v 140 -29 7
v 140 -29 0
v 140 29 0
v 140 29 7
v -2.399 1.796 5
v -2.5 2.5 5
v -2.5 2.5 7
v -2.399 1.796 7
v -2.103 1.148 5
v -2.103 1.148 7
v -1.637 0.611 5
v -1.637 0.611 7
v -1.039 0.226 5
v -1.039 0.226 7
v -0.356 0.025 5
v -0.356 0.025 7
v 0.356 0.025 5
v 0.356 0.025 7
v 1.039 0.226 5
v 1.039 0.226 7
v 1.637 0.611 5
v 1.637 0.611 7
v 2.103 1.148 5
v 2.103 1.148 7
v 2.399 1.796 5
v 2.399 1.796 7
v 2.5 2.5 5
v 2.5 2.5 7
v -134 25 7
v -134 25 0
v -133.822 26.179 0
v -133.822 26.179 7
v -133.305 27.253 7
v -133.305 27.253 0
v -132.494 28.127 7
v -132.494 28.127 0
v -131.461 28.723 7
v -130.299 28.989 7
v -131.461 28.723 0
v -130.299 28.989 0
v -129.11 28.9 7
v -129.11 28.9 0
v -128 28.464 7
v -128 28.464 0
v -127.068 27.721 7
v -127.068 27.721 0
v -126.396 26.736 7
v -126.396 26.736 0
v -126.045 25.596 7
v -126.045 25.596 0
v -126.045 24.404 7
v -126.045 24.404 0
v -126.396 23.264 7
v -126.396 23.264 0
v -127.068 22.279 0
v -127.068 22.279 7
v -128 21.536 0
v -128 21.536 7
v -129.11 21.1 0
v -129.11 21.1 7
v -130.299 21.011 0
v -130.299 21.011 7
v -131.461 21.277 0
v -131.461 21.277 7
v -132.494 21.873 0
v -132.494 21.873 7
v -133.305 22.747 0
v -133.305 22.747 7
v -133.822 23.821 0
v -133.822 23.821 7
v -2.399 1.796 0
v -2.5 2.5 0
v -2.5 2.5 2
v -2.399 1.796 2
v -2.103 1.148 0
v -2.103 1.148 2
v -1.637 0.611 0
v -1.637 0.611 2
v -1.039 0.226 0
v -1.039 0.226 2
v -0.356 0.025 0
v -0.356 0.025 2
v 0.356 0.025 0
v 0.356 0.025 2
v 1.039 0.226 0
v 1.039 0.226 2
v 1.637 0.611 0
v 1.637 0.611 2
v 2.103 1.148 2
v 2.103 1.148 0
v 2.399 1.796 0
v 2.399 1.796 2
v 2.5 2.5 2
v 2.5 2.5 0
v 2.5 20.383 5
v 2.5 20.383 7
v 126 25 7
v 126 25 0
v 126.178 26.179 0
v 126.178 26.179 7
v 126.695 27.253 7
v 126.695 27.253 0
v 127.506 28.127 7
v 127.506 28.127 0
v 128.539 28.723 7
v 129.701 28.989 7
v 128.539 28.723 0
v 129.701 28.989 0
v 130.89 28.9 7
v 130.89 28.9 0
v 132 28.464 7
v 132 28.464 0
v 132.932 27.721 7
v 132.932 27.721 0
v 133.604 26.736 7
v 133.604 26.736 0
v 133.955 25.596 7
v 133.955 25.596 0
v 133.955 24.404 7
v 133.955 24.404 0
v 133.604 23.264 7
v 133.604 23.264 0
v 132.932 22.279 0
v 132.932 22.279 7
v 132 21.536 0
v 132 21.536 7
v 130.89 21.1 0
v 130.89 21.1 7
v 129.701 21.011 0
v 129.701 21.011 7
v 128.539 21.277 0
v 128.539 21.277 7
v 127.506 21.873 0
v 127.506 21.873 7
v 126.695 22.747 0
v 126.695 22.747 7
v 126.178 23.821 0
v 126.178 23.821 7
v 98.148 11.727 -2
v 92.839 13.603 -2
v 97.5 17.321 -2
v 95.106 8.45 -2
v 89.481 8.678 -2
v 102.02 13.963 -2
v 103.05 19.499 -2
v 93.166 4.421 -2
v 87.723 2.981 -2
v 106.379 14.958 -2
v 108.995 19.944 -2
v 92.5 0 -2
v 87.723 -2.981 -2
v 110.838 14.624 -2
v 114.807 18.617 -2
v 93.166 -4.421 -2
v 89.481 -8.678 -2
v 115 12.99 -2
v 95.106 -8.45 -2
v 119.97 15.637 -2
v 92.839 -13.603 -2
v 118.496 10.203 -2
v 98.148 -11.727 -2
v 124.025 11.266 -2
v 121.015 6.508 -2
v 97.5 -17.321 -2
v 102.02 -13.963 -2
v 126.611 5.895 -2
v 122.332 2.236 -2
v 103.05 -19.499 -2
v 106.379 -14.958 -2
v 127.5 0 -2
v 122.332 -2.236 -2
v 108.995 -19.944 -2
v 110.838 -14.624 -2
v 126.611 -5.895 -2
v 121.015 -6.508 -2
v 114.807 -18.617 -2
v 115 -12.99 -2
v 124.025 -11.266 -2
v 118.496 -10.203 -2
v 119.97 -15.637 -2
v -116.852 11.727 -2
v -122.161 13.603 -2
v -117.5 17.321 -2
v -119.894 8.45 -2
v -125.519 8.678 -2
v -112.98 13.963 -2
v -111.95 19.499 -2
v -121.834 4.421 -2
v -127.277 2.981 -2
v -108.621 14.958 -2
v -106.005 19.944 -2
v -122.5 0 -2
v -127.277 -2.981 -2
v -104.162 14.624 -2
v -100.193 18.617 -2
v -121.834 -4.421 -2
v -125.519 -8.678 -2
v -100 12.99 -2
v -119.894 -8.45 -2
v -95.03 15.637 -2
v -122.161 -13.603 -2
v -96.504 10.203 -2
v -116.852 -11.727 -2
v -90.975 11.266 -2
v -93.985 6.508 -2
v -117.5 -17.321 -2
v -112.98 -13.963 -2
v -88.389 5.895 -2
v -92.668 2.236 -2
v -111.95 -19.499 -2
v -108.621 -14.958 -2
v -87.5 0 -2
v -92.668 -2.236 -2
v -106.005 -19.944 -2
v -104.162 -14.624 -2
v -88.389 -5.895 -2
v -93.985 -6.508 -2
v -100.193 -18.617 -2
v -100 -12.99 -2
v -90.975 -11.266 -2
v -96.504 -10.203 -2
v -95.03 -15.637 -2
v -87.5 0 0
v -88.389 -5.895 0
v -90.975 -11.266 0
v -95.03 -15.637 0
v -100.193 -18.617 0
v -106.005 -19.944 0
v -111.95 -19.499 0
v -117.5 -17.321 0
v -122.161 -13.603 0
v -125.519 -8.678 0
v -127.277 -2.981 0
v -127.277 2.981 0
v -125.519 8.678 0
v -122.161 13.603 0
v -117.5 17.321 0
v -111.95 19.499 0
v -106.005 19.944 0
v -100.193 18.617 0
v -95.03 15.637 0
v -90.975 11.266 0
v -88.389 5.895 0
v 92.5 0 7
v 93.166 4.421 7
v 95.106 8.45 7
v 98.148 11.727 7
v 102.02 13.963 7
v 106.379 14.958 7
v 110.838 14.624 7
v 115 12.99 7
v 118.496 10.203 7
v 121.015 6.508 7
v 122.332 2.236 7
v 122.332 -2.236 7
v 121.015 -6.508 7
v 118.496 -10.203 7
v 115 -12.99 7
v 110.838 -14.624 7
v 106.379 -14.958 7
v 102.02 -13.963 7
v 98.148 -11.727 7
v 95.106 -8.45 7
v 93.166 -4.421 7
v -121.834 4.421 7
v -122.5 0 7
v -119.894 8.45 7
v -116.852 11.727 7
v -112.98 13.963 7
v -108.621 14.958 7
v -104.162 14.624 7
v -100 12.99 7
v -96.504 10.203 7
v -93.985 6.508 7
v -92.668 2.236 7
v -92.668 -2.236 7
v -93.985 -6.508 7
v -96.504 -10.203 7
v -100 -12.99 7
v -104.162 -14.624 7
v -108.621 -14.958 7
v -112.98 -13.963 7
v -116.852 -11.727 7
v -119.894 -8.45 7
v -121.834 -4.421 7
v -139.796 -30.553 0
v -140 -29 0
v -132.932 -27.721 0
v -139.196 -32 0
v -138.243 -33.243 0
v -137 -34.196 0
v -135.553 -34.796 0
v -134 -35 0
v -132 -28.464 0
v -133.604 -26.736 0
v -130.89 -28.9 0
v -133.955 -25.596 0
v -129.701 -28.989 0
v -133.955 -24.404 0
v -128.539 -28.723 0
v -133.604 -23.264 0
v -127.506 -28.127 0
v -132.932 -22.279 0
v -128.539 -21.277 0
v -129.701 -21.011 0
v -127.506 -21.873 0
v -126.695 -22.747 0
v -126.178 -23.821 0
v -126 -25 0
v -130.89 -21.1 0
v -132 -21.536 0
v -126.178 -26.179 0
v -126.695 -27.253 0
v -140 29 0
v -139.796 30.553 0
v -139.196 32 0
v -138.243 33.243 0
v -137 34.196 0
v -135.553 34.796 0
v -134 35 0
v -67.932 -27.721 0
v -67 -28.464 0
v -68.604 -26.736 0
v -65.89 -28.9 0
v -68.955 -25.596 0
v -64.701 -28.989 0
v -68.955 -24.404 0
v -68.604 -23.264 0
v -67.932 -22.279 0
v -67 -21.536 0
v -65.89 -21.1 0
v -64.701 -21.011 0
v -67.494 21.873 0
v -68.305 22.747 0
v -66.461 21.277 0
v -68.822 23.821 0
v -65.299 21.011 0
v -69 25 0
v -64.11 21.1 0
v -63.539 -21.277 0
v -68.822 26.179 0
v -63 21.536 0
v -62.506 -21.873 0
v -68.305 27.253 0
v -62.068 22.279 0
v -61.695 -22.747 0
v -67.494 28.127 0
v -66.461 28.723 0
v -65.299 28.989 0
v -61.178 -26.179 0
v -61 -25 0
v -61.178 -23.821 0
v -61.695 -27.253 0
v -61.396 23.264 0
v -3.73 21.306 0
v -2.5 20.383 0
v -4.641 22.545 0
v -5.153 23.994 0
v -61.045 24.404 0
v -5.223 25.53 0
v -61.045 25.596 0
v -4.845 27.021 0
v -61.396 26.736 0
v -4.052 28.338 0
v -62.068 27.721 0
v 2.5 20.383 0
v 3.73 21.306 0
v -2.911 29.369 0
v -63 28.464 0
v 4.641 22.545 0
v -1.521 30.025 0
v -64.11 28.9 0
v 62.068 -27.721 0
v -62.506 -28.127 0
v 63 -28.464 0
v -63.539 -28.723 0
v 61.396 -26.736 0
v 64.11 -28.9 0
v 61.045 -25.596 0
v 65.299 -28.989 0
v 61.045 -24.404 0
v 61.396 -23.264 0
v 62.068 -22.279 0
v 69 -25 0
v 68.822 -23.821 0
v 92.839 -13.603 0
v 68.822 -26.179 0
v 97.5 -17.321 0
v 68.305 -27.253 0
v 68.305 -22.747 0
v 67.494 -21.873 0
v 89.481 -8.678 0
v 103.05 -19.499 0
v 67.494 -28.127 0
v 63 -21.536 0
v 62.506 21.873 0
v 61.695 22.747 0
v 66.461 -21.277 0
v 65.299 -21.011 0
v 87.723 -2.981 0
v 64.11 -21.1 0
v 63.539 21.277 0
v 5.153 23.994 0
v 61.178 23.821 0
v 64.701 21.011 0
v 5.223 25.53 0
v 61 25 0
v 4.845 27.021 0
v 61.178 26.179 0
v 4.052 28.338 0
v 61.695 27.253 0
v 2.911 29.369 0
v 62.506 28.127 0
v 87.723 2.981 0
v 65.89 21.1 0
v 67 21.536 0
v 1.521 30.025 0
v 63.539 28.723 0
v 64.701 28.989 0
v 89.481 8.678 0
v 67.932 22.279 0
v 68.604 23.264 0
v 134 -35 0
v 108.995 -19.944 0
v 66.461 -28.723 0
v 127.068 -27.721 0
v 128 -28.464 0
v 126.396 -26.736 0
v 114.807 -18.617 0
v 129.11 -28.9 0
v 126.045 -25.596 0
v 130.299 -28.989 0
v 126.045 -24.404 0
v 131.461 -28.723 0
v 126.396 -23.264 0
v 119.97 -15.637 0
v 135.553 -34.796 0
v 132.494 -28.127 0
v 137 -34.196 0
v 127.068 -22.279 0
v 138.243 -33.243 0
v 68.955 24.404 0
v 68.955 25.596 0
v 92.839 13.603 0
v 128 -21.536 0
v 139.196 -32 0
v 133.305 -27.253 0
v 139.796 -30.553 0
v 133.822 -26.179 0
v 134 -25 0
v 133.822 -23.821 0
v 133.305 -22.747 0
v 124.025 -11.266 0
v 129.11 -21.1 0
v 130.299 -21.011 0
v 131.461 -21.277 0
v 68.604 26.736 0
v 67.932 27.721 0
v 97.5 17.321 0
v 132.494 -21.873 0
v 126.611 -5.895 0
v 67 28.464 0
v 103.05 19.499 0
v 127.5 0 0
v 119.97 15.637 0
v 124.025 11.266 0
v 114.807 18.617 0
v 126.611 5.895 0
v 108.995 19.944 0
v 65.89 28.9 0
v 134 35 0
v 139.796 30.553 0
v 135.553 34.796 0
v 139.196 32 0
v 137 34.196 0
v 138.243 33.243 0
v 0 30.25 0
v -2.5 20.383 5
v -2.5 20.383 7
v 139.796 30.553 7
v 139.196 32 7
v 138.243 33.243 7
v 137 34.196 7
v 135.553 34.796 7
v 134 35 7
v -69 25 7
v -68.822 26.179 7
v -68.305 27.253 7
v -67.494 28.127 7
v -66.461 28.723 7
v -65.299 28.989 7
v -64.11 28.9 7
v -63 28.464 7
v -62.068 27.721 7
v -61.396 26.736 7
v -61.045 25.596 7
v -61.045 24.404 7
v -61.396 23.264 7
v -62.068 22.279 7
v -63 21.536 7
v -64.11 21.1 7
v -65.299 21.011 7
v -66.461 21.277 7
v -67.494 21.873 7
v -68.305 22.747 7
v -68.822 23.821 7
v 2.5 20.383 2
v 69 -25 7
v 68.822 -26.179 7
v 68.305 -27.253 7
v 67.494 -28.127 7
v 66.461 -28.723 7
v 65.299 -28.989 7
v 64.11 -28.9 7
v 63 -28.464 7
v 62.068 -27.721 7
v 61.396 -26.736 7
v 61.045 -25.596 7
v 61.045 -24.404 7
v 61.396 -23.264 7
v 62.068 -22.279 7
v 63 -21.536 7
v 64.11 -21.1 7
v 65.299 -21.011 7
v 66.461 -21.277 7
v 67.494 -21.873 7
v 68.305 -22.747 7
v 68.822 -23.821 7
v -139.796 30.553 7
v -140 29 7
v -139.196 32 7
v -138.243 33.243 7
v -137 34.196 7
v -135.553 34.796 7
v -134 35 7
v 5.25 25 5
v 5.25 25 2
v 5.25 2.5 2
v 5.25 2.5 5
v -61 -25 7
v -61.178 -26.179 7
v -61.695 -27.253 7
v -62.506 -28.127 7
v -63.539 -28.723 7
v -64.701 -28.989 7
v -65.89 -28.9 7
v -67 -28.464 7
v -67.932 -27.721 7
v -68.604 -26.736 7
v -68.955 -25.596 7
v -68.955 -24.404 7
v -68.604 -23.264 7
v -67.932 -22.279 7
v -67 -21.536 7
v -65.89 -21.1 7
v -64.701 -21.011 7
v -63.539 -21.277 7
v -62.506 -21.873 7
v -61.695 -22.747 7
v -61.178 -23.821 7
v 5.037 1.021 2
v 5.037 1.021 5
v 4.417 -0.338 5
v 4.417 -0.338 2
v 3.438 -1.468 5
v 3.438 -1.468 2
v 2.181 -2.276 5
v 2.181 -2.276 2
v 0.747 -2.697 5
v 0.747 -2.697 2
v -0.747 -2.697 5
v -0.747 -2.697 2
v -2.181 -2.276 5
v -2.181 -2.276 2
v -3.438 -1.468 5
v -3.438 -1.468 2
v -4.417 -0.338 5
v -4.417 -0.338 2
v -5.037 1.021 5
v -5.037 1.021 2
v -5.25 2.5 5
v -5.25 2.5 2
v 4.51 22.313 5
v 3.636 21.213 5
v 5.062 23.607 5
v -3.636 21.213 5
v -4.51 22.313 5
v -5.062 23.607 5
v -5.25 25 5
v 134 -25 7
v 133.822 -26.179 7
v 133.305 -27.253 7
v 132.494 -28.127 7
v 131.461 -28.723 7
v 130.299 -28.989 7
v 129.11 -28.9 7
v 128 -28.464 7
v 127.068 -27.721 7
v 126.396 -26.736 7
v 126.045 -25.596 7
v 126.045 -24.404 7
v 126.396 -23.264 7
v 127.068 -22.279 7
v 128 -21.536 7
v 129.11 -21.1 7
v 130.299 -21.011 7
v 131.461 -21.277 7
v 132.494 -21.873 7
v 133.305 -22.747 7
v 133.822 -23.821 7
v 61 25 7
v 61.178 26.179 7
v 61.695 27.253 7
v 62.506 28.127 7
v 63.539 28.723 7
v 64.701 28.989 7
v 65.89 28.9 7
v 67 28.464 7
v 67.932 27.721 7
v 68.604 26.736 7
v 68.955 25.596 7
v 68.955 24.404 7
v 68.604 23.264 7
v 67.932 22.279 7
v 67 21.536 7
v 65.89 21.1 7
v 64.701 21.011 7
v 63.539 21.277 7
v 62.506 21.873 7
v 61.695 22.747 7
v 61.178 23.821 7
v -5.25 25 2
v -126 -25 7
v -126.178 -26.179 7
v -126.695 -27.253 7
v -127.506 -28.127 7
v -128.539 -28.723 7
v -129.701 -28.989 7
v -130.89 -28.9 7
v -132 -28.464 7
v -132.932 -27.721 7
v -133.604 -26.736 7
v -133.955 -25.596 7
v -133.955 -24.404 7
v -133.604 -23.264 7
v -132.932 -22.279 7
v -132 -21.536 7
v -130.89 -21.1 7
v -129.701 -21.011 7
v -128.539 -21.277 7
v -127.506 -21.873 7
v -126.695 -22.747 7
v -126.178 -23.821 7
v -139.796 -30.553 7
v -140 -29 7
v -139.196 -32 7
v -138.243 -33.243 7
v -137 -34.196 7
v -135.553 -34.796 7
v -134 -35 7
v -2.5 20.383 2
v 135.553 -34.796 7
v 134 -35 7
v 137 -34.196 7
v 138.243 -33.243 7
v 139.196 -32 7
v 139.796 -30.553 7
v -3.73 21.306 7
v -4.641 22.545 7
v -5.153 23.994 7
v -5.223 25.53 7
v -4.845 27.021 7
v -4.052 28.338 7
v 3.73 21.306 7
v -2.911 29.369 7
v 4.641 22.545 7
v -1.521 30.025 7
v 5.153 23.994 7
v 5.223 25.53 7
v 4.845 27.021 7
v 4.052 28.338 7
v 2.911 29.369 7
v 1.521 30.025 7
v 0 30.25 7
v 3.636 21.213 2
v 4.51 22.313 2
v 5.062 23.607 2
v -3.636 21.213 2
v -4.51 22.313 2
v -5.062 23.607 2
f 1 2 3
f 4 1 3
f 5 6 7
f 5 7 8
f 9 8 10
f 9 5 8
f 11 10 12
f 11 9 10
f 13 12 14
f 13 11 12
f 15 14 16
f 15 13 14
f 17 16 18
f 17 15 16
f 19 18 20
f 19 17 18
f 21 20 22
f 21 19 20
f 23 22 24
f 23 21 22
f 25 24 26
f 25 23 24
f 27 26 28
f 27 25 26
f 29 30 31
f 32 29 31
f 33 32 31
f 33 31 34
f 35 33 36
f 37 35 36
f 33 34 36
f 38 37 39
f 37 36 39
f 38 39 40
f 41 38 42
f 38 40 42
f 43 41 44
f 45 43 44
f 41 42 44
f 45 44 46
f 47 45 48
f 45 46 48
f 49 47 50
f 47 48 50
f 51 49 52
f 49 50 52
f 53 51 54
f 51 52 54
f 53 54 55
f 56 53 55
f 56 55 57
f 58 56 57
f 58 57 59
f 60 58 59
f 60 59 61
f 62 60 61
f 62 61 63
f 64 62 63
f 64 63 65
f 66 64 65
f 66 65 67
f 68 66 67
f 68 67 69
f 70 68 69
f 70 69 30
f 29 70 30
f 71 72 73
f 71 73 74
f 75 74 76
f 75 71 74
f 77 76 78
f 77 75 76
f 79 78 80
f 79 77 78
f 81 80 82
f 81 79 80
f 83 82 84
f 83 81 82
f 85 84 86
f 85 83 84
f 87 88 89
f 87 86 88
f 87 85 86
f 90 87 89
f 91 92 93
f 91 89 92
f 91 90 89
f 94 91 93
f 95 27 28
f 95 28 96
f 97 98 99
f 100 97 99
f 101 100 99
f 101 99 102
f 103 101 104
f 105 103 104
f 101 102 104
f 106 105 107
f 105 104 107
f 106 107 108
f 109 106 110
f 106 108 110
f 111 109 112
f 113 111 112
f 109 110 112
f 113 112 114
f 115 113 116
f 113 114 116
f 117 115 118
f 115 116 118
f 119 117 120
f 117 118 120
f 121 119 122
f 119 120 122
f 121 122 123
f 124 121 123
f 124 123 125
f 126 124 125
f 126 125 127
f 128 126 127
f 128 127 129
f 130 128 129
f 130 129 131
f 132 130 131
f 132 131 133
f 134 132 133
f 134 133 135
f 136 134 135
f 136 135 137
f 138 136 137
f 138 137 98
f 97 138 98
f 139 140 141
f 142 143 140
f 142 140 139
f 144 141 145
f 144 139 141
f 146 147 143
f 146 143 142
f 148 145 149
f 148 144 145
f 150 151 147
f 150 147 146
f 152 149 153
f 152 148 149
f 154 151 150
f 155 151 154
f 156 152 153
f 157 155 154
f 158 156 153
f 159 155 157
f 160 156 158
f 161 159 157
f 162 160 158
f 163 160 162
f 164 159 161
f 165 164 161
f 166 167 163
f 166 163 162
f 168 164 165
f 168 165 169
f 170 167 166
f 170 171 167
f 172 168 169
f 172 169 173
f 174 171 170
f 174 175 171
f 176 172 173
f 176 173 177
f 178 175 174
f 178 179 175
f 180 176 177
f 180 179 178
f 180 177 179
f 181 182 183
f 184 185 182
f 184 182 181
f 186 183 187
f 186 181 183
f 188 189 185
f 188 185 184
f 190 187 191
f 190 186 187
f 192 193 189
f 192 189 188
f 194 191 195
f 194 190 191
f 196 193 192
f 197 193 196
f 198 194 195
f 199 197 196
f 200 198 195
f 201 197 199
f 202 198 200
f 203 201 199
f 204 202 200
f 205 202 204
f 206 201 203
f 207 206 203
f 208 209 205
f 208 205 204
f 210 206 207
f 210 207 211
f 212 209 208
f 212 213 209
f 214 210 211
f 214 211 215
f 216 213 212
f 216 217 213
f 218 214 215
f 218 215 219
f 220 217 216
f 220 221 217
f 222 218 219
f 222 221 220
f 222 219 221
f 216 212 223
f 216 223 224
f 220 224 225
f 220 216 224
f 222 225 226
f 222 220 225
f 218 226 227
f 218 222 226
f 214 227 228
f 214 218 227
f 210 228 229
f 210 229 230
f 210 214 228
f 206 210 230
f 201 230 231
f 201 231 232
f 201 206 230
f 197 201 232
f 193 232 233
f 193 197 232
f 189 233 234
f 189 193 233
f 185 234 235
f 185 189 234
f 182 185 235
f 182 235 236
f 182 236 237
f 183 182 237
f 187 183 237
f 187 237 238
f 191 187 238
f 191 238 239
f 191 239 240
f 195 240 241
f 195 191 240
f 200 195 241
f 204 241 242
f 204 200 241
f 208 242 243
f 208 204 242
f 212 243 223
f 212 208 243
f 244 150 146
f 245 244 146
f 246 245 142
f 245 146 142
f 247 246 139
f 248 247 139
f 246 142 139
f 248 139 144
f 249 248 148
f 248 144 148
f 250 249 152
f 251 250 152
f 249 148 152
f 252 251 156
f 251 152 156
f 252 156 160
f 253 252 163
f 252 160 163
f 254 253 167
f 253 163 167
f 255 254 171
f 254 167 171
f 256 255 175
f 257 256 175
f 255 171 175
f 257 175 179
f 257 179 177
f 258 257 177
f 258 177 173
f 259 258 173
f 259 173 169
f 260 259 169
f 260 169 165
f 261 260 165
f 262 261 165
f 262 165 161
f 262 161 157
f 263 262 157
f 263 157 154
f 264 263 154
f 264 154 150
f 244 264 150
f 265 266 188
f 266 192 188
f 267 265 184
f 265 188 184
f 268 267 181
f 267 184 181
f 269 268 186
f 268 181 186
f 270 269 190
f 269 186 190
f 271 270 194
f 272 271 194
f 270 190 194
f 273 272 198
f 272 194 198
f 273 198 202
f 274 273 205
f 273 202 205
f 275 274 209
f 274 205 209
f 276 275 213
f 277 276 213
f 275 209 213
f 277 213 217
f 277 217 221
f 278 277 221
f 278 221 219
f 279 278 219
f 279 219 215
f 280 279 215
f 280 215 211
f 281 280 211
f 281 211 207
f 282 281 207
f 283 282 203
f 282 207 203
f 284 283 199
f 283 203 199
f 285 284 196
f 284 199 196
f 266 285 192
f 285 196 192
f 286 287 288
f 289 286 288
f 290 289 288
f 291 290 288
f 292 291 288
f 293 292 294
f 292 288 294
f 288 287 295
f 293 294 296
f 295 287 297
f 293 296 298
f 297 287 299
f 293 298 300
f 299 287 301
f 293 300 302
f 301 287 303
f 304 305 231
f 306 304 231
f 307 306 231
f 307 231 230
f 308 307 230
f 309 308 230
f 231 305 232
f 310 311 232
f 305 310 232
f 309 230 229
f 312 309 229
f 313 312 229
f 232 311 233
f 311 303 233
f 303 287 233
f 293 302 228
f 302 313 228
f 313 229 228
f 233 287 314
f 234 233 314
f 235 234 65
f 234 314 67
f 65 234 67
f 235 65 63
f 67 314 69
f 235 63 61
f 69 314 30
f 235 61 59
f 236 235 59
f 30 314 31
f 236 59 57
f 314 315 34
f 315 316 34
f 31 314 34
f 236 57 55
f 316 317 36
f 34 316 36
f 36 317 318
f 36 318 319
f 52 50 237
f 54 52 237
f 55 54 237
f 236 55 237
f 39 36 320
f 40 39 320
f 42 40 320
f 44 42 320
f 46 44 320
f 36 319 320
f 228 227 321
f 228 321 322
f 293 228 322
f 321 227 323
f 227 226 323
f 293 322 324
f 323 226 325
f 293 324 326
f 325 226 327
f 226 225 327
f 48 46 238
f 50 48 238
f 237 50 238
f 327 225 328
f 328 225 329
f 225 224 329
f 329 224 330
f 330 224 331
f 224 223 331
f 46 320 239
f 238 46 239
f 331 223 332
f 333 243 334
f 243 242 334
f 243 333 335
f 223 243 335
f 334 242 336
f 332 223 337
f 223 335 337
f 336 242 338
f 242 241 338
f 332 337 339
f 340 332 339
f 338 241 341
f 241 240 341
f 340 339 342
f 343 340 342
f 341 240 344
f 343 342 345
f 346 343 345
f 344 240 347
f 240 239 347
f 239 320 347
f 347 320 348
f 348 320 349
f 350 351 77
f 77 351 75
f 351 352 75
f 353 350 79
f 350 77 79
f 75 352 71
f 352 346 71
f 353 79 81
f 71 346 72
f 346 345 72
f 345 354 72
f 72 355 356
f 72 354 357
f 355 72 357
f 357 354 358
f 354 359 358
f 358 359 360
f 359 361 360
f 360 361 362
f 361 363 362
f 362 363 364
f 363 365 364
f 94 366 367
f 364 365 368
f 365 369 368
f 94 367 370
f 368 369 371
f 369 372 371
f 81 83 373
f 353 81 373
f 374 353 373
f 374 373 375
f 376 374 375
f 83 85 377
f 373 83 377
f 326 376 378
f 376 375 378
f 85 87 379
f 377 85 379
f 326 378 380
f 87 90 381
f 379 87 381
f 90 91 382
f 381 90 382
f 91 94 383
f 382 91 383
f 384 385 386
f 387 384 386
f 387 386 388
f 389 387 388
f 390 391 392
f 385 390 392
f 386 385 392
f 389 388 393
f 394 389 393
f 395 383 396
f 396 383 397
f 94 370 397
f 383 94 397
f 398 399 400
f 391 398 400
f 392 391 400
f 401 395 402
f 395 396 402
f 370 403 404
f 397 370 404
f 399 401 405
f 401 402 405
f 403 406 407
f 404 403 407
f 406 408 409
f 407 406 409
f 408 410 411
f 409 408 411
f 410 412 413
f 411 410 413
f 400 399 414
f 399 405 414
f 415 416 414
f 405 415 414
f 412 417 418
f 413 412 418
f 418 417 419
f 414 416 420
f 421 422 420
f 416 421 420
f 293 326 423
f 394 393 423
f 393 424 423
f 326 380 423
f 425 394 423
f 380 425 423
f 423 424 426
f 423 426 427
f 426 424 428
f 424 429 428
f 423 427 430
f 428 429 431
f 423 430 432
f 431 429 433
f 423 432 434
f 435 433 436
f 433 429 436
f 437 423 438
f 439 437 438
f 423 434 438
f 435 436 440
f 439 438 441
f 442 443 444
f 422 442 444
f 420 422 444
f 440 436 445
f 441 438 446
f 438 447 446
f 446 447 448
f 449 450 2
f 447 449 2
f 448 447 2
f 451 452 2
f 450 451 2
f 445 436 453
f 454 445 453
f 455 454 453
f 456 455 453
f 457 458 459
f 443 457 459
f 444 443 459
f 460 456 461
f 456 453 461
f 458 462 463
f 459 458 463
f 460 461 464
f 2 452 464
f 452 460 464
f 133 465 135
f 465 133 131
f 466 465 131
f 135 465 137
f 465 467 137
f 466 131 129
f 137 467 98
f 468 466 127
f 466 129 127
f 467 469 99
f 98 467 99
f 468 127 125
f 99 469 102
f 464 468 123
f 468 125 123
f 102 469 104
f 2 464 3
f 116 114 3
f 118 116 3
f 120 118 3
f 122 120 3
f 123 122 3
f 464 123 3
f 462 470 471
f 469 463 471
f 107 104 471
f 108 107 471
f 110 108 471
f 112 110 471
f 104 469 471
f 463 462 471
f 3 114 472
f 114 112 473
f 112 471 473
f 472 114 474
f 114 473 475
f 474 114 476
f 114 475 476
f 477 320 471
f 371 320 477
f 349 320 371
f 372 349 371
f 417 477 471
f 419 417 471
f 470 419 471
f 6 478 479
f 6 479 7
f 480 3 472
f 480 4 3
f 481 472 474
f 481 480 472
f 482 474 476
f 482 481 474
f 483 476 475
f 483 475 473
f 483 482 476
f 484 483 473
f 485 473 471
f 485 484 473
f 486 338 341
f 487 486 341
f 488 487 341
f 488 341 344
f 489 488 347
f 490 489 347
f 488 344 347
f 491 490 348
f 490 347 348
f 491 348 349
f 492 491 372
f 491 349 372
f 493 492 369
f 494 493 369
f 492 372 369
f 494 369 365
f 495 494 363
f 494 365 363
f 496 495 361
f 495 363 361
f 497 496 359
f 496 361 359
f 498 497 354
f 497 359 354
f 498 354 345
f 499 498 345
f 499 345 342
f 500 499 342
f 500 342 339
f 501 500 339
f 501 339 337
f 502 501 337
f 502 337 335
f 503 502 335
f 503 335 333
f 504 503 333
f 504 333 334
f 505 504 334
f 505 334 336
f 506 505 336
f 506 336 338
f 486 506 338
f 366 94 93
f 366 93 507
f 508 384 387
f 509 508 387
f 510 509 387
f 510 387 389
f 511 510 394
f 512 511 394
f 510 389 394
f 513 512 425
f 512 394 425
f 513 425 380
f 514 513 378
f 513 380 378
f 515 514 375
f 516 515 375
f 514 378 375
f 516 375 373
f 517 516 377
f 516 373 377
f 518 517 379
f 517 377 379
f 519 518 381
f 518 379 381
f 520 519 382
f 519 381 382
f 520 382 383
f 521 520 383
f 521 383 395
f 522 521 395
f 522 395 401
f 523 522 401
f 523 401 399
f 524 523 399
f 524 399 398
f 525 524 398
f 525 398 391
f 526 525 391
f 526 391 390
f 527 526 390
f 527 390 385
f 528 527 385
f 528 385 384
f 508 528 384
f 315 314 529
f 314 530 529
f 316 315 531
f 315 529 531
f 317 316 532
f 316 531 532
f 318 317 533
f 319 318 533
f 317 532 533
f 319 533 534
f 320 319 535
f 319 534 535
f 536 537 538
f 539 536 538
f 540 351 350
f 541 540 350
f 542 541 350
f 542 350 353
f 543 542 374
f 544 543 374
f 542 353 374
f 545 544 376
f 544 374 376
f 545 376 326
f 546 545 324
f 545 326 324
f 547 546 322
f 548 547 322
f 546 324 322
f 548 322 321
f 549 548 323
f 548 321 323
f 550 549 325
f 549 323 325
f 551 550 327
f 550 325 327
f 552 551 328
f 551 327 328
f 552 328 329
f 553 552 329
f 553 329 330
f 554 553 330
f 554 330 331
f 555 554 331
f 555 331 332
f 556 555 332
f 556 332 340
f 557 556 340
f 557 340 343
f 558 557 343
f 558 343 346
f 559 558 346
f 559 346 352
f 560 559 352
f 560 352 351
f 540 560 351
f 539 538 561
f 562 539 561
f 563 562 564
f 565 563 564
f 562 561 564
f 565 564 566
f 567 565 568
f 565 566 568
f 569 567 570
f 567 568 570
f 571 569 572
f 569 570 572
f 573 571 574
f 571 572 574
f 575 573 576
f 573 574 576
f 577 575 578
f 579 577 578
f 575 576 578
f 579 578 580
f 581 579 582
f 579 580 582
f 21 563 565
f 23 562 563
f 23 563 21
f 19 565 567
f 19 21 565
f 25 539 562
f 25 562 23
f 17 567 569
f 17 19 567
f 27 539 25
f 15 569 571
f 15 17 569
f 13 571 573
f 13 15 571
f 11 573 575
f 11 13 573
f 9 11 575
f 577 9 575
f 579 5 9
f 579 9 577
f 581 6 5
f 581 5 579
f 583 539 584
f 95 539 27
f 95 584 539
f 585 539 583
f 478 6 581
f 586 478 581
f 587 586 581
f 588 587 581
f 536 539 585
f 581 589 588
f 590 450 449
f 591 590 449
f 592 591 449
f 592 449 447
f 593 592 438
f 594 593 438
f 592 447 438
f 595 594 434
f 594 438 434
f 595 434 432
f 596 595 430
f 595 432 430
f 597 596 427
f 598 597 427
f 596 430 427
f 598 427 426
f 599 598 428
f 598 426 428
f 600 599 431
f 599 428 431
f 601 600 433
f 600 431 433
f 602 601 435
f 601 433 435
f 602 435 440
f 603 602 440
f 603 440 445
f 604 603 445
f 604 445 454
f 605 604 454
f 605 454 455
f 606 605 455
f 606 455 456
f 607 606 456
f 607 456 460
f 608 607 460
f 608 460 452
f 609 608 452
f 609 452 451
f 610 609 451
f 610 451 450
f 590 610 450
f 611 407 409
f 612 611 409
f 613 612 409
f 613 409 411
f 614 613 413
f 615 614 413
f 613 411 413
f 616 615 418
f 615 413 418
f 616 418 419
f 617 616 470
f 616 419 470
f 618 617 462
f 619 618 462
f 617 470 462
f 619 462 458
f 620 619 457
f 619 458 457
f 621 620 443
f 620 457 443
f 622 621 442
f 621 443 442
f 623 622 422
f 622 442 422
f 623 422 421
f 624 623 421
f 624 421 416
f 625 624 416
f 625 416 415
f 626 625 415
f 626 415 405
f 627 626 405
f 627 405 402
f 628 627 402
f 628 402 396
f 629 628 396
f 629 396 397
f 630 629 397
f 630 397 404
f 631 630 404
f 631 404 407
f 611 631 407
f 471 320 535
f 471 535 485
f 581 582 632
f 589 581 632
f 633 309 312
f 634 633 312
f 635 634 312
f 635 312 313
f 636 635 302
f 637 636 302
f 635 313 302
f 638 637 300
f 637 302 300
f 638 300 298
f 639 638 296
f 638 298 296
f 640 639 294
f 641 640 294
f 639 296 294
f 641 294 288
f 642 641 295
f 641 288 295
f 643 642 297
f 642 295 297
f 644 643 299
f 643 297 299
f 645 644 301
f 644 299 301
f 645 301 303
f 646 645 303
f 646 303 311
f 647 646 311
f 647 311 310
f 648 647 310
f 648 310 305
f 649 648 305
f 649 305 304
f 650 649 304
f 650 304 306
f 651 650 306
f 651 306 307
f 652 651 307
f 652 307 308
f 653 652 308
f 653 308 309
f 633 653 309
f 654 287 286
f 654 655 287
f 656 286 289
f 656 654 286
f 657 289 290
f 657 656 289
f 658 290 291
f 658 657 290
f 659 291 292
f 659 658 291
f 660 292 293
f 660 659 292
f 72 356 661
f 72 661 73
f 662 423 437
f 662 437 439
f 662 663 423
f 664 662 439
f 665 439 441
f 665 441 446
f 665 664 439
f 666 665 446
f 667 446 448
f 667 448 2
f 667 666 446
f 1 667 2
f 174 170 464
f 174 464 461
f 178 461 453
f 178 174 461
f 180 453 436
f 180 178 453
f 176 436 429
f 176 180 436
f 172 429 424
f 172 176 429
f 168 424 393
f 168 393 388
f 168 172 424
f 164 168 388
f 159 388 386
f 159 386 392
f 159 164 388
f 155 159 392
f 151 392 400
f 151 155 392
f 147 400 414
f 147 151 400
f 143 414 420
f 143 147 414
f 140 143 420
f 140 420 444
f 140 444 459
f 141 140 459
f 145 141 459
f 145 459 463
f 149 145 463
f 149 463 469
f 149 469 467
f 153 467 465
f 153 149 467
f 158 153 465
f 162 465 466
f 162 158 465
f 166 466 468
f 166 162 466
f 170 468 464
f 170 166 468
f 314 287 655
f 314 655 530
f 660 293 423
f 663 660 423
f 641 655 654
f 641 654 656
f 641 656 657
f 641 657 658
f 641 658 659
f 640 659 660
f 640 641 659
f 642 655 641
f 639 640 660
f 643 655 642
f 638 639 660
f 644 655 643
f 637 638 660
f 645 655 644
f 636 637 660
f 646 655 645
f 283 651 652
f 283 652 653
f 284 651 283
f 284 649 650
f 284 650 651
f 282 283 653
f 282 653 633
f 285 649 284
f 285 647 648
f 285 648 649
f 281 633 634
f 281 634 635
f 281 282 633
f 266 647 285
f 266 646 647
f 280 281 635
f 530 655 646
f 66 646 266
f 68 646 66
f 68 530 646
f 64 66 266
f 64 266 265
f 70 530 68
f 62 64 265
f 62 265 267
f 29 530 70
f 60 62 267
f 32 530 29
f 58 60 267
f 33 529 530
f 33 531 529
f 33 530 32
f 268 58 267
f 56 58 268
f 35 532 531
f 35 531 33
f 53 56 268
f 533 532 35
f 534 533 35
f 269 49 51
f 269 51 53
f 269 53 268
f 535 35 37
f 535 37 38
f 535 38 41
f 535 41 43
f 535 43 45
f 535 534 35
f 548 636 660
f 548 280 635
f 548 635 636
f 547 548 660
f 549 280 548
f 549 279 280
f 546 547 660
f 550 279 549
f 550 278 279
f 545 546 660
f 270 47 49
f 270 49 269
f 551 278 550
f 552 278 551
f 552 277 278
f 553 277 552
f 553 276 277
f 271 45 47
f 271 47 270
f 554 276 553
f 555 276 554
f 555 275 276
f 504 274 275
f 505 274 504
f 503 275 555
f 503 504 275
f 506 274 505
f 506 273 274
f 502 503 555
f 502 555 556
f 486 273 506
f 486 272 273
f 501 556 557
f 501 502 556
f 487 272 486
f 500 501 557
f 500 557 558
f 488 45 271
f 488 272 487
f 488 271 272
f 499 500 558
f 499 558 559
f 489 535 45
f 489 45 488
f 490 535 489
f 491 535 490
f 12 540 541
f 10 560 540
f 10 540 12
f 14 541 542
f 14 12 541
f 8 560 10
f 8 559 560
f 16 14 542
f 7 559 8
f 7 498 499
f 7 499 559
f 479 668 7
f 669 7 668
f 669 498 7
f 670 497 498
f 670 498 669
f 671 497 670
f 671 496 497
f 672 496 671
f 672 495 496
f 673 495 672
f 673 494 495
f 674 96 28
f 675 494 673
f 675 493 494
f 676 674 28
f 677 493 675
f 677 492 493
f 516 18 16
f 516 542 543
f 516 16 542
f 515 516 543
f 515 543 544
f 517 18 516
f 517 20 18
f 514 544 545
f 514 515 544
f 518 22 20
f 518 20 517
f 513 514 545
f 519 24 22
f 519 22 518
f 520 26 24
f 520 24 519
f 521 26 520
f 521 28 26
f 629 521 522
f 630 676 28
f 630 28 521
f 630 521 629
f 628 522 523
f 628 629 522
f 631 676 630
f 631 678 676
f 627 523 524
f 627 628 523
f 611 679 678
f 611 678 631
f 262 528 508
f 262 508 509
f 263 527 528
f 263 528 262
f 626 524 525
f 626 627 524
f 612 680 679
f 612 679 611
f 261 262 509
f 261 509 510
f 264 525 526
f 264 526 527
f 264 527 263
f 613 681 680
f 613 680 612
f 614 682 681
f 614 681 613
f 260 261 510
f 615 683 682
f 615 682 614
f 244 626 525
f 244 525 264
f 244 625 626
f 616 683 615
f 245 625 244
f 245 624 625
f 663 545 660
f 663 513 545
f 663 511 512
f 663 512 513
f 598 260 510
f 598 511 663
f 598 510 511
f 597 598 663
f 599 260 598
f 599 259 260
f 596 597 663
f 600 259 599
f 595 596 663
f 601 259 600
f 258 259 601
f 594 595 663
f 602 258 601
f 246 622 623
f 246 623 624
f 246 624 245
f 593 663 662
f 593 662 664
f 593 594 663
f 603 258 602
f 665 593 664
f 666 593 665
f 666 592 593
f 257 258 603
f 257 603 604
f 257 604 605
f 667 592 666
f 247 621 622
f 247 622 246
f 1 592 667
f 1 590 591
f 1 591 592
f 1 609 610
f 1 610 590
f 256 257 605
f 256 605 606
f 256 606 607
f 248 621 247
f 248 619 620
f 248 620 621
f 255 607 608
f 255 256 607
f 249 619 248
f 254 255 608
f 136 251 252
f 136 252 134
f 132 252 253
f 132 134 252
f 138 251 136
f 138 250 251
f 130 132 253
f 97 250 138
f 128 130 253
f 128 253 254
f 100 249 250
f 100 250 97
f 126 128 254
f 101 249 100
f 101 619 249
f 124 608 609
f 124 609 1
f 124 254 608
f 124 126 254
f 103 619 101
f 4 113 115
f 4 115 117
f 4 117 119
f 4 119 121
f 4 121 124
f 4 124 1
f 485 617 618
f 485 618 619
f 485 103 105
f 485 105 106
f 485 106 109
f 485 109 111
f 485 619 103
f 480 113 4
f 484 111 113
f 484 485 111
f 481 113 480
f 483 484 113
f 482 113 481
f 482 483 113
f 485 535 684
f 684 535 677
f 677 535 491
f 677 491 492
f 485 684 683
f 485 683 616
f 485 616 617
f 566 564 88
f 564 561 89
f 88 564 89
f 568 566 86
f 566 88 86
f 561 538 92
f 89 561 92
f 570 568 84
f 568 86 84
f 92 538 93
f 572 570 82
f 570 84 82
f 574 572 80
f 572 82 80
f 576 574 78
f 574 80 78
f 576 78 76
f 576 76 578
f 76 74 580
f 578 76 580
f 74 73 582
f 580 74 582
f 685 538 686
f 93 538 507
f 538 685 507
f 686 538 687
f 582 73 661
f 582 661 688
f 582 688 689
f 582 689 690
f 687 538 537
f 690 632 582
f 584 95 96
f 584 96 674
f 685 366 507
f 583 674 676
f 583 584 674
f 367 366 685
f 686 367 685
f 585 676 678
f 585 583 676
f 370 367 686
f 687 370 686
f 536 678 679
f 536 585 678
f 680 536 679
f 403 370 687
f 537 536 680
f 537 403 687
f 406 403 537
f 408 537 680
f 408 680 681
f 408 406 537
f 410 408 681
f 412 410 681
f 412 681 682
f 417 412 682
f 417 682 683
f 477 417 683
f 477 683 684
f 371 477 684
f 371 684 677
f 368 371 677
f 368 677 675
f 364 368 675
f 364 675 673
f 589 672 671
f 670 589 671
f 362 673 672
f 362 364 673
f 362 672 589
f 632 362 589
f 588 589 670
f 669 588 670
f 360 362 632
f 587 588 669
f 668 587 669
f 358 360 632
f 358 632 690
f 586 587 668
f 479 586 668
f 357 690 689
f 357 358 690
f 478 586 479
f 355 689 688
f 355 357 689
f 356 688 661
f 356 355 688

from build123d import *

# Parameters (mm, degrees)
SKETCH1_W           = 280
SKETCH1_H           = 70
BOSS_EXTRUDE1_DEPTH = 7
FILLET1_R           = 6
SKETCH2_R           = 15
SKETCH2_R_2         = 4
CUT_EXTRUDE1_DEPTH  = 10
BOSS_EXTRUDE2_START = 2
SKETCH3_R           = 20
SKETCH3_R_2         = 15
BOSS_EXTRUDE2_DEPTH = 2
CUT_EXTRUDE2_DEPTH  = 3


with BuildPart() as part:
    # Sketch1 → Boss-Extrude1 (new body)
    with BuildSketch(Plane.XY):
        Rectangle(SKETCH1_W, SKETCH1_H)
    extrude(amount=BOSS_EXTRUDE1_DEPTH)

    # Fillet1
    fillet1_edges = [part.edges().sort_by_distance(p)[0] for p in [
        (140, -35, 3.5),
        (-140, -35, 3.5),
        (-140, 35, 3.5),
        (140, 35, 3.5),
    ]]
    fillet(fillet1_edges, radius=FILLET1_R)

    # Sketch2 → Cut-Extrude1 (cut)
    with BuildSketch(Plane(origin=(0, 0, 0), x_dir=(-1, 0, 0), z_dir=(0, 0, -1))):
        with Locations((-107.5, 0)):
            Circle(SKETCH2_R)
        with Locations((107.5, 0)):
            Circle(SKETCH2_R)
        with Locations((130, 25)):
            Circle(SKETCH2_R_2)
        with Locations((65, 25)):
            Circle(SKETCH2_R_2)
        with Locations((-65, 25)):
            Circle(SKETCH2_R_2)
        with Locations((-130, 25)):
            Circle(SKETCH2_R_2)
        with Locations(Location((-130, -25, 0), (0, 0, 180))):
            Circle(SKETCH2_R_2)
        with Locations(Location((-65, -25, 0), (0, 0, 180))):
            Circle(SKETCH2_R_2)
        with Locations(Location((65, -25, 0), (0, 0, 180))):
            Circle(SKETCH2_R_2)
        with Locations(Location((130, -25, 0), (0, 0, 180))):
            Circle(SKETCH2_R_2)
        with BuildLine():
            Line((-2.5, 2.5), (-2.5, 20.383453672))
            ThreePointArc((-2.5, 20.383453672), (0, 30.25), (2.5, 20.383453672))
            Line((2.5, 20.383453672), (2.5, 2.5))
            ThreePointArc((2.5, 2.5), (0, 0), (-2.5, 2.5))
        make_face()
    extrude(amount=-CUT_EXTRUDE1_DEPTH, mode=Mode.SUBTRACT)

    # Sketch3 → Boss-Extrude2 (add)
    # profile 1 of 2: a face of its own
    with BuildSketch(Plane(origin=(0, 0, 0), x_dir=(-1, 0, 0), z_dir=(0, 0, -1)).offset(BOSS_EXTRUDE2_START)):
        with Locations(Location((-107.5, 0, 0), (0, 0, 180))):
            Circle(SKETCH3_R)
        with Locations((-107.5, 0)):
            Circle(SKETCH3_R_2, mode=Mode.SUBTRACT)
    # profile 2 of 2: a face of its own
    with BuildSketch(Plane(origin=(0, 0, 0), x_dir=(-1, 0, 0), z_dir=(0, 0, -1)).offset(BOSS_EXTRUDE2_START)):
        with Locations(Location((107.5, 0, 0), (0, 0, 180))):
            Circle(SKETCH3_R)
        with Locations((107.5, 0)):
            Circle(SKETCH3_R_2, mode=Mode.SUBTRACT)
    extrude(amount=-BOSS_EXTRUDE2_DEPTH)

    # Sketch4 → Cut-Extrude2 (cut)
    with BuildSketch(Plane(origin=(0, 0, 2), x_dir=(-1, 0, 0), z_dir=(0, 0, -1))):
        with BuildLine():
            Line((0, 25), (-5.25, 25))
            Line((-5.25, 25), (-5.25, 2.5))
            ThreePointArc((-5.25, 2.5), (0, -2.75), (5.25, 2.5))
            Line((5.25, 2.5), (5.25, 25))
            Line((5.25, 25), (0, 25))
        make_face()
    extrude(amount=-CUT_EXTRUDE2_DEPTH, mode=Mode.SUBTRACT)


solid = part.part
